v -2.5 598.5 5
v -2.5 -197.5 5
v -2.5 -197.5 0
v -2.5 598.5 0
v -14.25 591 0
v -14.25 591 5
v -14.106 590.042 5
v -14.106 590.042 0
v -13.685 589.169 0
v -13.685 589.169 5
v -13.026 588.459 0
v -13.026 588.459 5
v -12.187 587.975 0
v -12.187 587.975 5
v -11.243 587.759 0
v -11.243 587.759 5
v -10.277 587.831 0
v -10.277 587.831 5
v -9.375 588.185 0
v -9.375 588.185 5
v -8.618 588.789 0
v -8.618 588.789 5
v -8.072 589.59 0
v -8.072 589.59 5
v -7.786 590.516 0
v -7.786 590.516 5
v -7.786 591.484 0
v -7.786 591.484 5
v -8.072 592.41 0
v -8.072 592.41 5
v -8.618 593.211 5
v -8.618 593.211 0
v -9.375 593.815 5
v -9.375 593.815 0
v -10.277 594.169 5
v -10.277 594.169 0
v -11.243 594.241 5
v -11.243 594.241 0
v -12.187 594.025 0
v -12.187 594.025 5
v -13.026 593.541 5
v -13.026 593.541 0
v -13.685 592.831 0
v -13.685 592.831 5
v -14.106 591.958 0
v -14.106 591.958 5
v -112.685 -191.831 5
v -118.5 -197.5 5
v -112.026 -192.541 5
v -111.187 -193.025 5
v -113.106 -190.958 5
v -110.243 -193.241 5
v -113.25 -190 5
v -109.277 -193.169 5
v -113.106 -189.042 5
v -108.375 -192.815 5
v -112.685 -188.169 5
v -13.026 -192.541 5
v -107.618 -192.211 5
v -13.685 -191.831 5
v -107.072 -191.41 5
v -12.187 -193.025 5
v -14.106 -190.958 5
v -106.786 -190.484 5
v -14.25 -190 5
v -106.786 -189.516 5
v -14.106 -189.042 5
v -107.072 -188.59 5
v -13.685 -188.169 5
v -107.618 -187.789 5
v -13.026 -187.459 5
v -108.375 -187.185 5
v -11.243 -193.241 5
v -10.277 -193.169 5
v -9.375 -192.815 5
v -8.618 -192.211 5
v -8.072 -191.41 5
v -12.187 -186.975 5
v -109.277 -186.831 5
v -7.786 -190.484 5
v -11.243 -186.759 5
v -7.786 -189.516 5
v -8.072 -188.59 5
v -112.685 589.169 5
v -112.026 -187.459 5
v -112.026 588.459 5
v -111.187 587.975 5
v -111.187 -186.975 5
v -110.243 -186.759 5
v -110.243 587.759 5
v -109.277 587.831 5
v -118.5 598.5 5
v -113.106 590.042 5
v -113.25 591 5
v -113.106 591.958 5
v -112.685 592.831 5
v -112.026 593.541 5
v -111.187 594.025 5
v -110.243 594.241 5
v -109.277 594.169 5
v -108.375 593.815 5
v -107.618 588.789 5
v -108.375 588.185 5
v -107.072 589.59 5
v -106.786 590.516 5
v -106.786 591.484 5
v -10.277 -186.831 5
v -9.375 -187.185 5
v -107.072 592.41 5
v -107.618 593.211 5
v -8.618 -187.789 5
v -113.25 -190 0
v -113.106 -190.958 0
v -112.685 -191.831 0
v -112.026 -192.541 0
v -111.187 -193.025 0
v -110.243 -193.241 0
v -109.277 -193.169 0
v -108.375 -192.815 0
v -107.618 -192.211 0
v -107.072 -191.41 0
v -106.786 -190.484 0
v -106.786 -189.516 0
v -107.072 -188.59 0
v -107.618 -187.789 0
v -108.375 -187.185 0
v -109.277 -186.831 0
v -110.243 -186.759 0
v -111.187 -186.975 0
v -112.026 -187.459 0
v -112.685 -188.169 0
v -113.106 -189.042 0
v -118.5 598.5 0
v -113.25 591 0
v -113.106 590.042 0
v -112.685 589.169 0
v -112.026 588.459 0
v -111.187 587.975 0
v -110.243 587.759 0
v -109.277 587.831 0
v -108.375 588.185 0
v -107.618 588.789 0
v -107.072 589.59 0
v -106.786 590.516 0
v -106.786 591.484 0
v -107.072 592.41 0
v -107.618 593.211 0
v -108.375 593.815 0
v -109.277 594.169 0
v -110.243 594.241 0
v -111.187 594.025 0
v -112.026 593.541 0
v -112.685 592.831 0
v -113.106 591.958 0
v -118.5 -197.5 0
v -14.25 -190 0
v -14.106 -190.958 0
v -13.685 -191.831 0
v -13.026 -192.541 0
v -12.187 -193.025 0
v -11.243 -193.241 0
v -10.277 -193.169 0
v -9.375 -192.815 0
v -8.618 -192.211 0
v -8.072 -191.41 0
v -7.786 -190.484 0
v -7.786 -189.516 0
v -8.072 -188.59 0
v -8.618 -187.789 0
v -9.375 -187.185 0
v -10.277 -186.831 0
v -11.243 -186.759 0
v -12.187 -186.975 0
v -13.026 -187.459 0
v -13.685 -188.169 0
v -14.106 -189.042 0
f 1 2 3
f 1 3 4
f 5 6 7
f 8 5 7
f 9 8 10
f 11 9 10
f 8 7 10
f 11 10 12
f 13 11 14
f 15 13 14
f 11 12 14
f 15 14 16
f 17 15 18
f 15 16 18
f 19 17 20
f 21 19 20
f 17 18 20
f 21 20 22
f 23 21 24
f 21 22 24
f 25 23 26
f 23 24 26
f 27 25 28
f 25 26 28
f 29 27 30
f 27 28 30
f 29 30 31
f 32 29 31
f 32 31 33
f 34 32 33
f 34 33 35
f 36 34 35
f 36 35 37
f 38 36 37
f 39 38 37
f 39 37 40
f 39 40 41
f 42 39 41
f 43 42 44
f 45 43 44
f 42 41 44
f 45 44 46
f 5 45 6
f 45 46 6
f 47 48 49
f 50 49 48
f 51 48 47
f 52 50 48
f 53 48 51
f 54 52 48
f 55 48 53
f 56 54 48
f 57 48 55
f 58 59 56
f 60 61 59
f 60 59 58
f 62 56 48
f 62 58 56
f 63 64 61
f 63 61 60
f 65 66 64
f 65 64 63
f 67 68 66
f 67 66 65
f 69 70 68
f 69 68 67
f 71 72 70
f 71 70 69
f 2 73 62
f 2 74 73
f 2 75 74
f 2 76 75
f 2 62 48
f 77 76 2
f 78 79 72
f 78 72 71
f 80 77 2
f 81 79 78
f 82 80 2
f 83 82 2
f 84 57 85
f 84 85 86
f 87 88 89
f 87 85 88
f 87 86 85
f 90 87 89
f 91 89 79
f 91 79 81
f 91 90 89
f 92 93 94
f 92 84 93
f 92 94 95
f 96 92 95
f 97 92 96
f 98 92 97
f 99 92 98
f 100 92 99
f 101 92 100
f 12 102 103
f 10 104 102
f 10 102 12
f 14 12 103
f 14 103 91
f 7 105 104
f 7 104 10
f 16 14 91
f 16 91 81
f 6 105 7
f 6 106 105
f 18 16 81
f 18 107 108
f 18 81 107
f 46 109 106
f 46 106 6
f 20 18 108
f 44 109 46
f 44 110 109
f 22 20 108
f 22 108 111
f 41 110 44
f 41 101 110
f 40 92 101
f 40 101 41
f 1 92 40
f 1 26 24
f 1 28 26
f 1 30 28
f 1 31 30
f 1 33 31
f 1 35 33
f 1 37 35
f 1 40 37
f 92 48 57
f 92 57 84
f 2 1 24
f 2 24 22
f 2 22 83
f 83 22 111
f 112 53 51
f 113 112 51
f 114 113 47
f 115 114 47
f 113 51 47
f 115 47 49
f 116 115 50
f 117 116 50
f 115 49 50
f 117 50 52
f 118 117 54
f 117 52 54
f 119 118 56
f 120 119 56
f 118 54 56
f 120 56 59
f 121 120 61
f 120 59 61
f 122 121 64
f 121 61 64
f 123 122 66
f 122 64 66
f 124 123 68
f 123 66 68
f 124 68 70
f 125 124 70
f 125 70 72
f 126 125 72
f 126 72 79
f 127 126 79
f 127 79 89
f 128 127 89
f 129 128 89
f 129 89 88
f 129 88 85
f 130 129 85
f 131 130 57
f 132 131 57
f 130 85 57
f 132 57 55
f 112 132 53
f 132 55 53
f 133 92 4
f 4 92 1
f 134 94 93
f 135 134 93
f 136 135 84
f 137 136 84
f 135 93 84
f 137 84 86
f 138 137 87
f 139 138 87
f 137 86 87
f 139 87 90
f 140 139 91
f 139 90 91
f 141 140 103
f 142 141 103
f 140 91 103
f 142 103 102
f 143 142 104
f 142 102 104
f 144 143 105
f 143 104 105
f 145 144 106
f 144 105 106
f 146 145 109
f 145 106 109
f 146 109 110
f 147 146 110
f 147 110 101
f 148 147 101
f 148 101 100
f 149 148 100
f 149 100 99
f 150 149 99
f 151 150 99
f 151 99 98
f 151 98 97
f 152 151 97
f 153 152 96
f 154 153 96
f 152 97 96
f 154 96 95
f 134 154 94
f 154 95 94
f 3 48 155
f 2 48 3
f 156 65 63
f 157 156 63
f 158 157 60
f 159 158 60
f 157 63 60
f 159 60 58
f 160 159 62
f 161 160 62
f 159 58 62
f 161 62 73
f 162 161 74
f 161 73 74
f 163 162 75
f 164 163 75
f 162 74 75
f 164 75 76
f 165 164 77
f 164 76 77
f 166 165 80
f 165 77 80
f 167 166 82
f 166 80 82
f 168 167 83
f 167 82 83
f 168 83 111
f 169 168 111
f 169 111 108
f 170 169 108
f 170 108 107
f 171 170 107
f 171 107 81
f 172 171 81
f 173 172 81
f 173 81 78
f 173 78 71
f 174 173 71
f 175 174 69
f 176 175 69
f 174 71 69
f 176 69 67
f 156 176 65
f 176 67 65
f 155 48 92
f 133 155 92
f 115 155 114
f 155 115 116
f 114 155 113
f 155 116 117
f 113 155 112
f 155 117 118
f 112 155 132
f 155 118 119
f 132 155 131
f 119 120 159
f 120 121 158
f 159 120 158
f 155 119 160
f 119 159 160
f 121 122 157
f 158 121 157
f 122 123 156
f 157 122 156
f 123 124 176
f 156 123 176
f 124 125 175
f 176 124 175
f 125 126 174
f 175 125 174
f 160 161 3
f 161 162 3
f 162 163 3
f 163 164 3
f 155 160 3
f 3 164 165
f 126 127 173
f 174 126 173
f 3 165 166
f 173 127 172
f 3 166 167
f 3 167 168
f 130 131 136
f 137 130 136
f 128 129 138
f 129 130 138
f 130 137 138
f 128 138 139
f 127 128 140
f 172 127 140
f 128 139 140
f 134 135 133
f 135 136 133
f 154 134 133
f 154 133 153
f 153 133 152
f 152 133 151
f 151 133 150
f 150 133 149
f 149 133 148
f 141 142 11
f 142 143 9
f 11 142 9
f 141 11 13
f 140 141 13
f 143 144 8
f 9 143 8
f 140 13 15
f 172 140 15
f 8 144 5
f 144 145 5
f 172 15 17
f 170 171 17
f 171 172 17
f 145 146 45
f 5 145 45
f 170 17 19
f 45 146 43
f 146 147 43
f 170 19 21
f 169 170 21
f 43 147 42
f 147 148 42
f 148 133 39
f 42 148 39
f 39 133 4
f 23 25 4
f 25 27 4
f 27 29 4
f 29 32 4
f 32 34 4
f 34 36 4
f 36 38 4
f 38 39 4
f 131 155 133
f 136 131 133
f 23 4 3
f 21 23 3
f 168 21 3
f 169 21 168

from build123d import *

# Parameters (mm, degrees)
SCHIZZO1_W                   = 116
SCHIZZO1_H                   = 796
SCHIZZO1_R                   = 3.25
ESTRUSIONE_ESTRUSIONE1_DEPTH = 5


with BuildPart() as part:
    # Schizzo1 → Estrusione-Estrusione1 (new body)
    with BuildSketch(Plane.XY.offset(5)):
        with Locations((-60.5, 200.5)):
            Rectangle(SCHIZZO1_W, SCHIZZO1_H)
        with Locations(Location((-110, -190, 0), (0, 0, 180))):
            Circle(SCHIZZO1_R, mode=Mode.SUBTRACT)
        with Locations(Location((-110, 591, 0), (0, 0, 180))):
            Circle(SCHIZZO1_R, mode=Mode.SUBTRACT)
        with Locations(Location((-11, 591, 0), (0, 0, 180))):
            Circle(SCHIZZO1_R, mode=Mode.SUBTRACT)
        with Locations(Location((-11, -190, 0), (0, 0, 180))):
            Circle(SCHIZZO1_R, mode=Mode.SUBTRACT)
    extrude(amount=-ESTRUSIONE_ESTRUSIONE1_DEPTH)


solid = part.part
